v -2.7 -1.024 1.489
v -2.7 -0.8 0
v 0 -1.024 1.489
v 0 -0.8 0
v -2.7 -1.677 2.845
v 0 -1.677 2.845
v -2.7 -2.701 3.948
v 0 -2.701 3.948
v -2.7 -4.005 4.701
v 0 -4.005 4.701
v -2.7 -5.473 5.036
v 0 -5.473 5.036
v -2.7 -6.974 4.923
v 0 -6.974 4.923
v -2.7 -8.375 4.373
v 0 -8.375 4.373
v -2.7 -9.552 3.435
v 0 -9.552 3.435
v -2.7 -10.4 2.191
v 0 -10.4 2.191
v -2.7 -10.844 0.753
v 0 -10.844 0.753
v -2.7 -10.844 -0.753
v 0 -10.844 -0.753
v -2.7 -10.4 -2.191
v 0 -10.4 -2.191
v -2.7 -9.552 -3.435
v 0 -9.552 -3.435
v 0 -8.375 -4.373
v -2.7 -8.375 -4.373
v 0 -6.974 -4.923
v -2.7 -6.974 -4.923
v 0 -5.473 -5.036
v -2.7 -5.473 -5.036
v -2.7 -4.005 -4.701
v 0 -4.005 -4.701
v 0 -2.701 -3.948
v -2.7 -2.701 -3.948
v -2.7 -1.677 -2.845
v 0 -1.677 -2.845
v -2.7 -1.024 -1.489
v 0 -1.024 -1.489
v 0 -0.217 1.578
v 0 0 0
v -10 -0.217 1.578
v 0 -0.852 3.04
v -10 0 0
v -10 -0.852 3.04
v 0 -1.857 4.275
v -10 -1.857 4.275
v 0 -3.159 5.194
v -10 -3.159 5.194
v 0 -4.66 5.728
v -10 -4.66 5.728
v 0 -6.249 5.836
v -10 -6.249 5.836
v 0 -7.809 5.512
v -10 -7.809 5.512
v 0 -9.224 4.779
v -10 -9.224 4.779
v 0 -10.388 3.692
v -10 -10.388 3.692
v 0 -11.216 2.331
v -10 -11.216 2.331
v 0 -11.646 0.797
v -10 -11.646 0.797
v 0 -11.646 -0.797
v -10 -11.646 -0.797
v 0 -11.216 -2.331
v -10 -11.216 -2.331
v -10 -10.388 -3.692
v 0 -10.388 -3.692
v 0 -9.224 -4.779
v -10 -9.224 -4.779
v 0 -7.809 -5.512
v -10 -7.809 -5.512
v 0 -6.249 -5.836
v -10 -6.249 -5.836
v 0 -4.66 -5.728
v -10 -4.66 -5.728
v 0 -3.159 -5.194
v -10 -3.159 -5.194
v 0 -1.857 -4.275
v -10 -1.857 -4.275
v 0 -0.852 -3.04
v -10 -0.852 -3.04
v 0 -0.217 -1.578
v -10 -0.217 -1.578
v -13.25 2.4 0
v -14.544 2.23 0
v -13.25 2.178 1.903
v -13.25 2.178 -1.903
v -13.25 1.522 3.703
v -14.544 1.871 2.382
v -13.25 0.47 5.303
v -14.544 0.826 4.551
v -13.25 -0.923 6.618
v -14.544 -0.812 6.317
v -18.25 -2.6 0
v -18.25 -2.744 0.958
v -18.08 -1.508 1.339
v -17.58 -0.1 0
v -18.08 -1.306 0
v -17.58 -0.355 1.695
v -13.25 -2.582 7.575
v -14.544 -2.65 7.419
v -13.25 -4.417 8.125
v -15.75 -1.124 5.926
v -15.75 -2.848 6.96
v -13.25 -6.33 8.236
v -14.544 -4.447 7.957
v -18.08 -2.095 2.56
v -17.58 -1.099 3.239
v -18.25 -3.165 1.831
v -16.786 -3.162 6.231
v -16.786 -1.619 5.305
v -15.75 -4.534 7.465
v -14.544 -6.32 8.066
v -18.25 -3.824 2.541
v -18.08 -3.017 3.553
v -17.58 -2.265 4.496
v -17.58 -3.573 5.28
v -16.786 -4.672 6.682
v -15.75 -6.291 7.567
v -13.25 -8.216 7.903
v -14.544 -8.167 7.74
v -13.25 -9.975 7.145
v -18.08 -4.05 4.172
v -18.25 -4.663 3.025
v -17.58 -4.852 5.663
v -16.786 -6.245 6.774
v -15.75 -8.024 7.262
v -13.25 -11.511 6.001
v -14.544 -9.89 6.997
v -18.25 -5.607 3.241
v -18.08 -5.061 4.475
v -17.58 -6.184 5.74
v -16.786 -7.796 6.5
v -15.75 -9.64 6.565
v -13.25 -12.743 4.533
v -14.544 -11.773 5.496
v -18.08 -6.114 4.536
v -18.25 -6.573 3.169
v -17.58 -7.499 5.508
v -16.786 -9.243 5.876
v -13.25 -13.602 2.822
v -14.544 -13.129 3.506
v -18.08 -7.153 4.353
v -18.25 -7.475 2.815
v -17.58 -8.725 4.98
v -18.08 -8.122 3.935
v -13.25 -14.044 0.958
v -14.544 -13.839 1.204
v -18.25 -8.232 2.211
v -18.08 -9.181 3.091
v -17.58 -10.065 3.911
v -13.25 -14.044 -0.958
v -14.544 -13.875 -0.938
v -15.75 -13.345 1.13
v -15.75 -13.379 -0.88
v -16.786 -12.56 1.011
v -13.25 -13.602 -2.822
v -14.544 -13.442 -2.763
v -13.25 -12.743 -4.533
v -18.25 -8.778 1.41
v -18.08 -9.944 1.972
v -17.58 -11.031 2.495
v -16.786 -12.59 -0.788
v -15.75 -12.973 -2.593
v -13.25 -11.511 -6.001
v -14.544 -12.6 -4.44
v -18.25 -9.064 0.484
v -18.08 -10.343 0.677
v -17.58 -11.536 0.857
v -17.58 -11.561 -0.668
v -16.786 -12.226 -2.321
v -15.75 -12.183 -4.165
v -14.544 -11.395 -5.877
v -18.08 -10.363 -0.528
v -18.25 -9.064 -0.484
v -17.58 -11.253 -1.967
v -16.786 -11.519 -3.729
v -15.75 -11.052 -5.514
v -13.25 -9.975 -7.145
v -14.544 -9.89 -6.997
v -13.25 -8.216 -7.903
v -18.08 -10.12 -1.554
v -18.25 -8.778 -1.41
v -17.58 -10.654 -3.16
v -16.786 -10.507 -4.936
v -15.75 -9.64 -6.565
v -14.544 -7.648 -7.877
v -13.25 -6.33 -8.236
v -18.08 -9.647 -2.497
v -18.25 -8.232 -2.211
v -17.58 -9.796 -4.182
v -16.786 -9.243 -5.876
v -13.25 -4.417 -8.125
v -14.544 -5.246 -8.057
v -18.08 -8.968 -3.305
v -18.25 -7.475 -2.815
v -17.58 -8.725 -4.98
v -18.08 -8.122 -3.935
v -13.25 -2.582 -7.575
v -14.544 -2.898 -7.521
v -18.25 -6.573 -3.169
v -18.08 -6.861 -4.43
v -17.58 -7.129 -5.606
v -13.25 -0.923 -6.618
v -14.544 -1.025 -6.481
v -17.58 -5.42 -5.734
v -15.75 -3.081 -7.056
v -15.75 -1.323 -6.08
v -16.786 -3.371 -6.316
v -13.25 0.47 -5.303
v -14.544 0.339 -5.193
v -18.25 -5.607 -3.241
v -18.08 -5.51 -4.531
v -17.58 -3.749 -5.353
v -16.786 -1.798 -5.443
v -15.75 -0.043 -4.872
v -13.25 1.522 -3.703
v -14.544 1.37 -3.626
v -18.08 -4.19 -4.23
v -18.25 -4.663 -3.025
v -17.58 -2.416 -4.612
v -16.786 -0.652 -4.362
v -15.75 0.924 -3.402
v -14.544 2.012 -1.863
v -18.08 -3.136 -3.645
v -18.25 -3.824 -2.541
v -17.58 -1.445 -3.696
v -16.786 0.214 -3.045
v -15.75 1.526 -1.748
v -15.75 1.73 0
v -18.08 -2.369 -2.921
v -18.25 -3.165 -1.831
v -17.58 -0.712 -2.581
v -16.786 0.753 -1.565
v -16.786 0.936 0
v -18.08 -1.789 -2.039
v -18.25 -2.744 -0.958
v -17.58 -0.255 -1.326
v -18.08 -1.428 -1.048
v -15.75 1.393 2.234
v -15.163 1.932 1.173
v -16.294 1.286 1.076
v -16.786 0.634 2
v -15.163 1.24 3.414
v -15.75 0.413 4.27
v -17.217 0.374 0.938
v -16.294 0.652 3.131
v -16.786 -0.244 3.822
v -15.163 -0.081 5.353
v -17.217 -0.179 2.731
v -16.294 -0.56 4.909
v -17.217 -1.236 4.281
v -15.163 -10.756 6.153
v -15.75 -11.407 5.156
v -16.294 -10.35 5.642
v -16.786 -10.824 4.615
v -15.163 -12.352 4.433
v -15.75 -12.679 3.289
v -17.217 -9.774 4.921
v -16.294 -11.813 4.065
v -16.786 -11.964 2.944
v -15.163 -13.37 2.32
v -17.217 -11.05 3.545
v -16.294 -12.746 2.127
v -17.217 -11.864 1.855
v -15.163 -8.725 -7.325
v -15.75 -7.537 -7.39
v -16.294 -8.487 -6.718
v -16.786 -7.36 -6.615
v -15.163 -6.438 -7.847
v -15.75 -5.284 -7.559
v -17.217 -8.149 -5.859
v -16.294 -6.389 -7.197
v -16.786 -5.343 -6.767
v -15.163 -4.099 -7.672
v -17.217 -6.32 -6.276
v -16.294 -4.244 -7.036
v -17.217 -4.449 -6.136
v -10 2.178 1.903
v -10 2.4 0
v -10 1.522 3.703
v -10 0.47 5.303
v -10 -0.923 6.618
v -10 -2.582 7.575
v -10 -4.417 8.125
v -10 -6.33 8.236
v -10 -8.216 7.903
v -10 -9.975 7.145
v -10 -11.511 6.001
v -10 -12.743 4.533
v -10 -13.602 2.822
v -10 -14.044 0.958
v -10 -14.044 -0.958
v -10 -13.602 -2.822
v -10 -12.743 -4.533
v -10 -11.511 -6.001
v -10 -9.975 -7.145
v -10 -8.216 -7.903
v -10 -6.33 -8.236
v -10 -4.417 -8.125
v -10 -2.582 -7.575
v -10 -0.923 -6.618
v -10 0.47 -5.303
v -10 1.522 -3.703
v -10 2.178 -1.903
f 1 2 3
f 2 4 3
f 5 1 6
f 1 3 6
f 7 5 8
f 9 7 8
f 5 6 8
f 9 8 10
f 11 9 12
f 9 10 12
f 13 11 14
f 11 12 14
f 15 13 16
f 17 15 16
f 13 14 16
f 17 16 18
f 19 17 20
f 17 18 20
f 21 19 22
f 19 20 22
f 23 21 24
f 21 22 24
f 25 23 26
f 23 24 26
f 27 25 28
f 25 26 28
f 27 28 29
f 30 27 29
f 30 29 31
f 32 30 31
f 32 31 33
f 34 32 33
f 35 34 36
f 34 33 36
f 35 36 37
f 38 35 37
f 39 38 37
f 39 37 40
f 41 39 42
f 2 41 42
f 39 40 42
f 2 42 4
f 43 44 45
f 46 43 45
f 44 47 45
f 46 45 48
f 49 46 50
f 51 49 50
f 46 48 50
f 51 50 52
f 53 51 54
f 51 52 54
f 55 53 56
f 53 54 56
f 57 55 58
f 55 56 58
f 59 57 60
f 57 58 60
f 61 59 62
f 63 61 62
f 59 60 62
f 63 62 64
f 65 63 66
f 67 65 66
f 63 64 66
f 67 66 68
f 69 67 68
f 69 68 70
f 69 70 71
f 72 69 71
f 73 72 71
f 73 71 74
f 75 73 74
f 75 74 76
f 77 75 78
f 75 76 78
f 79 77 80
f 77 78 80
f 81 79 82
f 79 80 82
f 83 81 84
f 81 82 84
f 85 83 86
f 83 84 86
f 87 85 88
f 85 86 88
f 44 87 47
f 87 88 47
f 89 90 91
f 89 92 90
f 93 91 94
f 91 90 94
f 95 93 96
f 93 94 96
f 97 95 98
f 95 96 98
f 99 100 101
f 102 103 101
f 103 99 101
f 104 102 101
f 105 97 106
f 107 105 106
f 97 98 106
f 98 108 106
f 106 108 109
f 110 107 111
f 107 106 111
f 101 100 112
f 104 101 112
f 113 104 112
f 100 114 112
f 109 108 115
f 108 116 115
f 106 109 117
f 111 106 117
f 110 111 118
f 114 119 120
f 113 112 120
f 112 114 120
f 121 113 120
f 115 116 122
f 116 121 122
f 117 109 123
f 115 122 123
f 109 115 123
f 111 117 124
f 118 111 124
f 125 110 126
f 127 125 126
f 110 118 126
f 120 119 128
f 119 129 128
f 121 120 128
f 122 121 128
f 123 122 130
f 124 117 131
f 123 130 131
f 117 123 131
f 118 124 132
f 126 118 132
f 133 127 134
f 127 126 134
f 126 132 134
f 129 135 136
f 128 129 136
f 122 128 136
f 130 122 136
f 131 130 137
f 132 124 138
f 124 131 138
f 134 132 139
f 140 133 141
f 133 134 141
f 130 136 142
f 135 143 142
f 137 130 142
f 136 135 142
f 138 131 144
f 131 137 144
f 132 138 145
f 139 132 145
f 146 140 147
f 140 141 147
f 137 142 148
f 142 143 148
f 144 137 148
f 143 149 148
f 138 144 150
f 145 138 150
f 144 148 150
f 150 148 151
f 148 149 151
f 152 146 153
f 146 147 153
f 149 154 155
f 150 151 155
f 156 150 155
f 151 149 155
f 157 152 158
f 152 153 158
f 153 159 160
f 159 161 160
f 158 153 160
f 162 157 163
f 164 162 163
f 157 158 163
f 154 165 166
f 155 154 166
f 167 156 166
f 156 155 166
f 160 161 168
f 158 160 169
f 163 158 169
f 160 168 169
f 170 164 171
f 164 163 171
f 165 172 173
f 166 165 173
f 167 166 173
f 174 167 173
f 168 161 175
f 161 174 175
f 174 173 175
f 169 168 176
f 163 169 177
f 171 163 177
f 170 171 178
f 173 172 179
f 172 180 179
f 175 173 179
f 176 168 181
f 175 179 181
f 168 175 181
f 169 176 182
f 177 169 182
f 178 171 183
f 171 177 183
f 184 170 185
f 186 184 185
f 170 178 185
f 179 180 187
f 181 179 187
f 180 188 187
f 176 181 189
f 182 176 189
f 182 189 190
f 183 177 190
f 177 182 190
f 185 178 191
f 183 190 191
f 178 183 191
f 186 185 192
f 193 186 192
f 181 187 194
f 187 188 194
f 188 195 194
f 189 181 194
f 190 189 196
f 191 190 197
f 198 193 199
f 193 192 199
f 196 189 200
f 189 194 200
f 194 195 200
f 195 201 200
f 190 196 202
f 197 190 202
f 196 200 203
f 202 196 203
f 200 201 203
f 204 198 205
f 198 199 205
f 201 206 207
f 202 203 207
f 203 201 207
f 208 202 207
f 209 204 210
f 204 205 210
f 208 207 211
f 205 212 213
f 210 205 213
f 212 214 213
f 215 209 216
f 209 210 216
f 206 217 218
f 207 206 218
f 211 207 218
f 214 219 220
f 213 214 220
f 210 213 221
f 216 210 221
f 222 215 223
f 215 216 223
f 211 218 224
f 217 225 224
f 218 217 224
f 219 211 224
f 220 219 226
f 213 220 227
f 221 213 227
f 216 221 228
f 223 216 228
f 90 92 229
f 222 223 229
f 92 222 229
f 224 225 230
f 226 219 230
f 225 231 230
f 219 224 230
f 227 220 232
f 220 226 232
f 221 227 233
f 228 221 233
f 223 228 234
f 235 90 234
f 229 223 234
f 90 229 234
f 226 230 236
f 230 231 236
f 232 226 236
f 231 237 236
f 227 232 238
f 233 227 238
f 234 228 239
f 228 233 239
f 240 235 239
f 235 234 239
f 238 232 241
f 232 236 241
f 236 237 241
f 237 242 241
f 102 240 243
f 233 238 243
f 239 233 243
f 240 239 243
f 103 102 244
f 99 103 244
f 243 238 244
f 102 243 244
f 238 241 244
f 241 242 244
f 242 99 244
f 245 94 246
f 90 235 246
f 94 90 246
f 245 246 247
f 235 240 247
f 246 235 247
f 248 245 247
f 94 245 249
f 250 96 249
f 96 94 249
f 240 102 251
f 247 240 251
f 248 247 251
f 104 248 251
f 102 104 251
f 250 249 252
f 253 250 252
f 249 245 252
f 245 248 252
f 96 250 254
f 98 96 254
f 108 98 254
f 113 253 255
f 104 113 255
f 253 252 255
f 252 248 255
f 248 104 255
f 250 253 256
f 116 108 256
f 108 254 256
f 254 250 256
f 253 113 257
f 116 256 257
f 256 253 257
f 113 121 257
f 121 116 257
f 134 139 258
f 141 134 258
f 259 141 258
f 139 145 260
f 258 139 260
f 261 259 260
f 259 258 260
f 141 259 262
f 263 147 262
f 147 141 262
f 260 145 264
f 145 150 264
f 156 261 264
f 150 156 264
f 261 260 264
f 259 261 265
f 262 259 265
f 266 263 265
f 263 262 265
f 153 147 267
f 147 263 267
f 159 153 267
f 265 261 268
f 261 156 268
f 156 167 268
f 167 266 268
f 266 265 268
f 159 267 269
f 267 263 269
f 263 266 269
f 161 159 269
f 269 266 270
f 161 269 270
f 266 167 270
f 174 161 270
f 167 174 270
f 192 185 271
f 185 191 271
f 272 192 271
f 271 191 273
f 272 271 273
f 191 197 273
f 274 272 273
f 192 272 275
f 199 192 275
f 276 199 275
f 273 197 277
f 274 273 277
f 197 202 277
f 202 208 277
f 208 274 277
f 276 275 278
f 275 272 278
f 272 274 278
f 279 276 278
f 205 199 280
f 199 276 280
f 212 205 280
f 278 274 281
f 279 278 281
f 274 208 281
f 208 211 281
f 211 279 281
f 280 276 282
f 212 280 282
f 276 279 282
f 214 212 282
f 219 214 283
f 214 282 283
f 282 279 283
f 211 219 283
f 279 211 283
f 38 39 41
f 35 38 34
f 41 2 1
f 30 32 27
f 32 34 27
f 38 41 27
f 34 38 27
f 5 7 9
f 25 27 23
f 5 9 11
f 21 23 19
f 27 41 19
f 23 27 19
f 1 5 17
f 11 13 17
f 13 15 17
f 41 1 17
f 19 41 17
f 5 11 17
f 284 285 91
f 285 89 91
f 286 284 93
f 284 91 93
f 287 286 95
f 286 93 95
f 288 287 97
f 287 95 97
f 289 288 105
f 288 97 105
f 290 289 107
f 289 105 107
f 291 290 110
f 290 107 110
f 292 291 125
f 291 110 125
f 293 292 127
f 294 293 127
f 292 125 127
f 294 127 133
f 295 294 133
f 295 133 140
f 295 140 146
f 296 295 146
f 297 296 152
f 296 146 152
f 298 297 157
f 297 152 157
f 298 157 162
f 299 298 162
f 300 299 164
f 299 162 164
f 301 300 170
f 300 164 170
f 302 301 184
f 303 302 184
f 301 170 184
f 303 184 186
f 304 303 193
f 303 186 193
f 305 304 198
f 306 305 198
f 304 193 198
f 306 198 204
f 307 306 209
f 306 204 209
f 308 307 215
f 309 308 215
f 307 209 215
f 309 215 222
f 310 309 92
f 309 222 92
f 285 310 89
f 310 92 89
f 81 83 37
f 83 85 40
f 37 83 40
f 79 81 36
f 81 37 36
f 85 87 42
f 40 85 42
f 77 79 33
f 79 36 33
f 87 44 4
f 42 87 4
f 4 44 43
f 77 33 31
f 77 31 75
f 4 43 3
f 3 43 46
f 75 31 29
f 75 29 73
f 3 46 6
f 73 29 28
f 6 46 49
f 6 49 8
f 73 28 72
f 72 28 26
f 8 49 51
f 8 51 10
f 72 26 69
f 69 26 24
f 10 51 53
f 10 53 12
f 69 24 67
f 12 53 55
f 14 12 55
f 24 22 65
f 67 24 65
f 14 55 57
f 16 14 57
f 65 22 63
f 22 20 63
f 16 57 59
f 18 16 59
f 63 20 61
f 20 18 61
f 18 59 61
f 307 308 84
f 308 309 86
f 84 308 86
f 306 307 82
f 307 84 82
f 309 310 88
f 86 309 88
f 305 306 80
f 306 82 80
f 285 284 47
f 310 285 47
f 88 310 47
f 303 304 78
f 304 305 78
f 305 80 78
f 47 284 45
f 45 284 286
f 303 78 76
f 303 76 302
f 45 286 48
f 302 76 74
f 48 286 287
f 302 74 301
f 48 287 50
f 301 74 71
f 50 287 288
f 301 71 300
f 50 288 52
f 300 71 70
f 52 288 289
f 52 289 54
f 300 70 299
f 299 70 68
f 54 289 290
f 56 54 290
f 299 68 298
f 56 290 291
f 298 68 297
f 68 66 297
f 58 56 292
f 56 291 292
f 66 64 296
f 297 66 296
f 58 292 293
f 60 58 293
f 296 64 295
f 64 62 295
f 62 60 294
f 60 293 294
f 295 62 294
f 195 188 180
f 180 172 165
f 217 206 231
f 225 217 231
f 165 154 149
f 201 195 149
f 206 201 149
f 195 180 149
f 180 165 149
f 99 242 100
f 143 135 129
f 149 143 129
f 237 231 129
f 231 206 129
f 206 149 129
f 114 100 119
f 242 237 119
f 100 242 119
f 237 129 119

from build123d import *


with BuildPart() as part:
    # Skizze1 → Rotation1 (revolve)
    with BuildSketch(Plane.XY):
        with BuildLine():
            Line((0, 0), (-10, 0))
            Line((-10, 0), (-10, 2.4))
            Line((-10, 2.4), (-13.25, 2.4))
            ThreePointArc((-13.25, 2.4), (-16.785533906, 0.935533906), (-18.25, -2.6))
            Line((-18.25, -2.6), (-18.25, -5.85))
            Line((-18.25, -5.85), (-2.7, -5.85))
            Line((-2.7, -5.85), (-2.7, -0.8))
            Line((-2.7, -0.8), (0, -0.8))
            Line((0, -0.8), (0, 0))
        make_face()
    revolve(axis=Axis((-27.302993085, -5.85, 0), (1, 0, 0)))


solid = part.part
